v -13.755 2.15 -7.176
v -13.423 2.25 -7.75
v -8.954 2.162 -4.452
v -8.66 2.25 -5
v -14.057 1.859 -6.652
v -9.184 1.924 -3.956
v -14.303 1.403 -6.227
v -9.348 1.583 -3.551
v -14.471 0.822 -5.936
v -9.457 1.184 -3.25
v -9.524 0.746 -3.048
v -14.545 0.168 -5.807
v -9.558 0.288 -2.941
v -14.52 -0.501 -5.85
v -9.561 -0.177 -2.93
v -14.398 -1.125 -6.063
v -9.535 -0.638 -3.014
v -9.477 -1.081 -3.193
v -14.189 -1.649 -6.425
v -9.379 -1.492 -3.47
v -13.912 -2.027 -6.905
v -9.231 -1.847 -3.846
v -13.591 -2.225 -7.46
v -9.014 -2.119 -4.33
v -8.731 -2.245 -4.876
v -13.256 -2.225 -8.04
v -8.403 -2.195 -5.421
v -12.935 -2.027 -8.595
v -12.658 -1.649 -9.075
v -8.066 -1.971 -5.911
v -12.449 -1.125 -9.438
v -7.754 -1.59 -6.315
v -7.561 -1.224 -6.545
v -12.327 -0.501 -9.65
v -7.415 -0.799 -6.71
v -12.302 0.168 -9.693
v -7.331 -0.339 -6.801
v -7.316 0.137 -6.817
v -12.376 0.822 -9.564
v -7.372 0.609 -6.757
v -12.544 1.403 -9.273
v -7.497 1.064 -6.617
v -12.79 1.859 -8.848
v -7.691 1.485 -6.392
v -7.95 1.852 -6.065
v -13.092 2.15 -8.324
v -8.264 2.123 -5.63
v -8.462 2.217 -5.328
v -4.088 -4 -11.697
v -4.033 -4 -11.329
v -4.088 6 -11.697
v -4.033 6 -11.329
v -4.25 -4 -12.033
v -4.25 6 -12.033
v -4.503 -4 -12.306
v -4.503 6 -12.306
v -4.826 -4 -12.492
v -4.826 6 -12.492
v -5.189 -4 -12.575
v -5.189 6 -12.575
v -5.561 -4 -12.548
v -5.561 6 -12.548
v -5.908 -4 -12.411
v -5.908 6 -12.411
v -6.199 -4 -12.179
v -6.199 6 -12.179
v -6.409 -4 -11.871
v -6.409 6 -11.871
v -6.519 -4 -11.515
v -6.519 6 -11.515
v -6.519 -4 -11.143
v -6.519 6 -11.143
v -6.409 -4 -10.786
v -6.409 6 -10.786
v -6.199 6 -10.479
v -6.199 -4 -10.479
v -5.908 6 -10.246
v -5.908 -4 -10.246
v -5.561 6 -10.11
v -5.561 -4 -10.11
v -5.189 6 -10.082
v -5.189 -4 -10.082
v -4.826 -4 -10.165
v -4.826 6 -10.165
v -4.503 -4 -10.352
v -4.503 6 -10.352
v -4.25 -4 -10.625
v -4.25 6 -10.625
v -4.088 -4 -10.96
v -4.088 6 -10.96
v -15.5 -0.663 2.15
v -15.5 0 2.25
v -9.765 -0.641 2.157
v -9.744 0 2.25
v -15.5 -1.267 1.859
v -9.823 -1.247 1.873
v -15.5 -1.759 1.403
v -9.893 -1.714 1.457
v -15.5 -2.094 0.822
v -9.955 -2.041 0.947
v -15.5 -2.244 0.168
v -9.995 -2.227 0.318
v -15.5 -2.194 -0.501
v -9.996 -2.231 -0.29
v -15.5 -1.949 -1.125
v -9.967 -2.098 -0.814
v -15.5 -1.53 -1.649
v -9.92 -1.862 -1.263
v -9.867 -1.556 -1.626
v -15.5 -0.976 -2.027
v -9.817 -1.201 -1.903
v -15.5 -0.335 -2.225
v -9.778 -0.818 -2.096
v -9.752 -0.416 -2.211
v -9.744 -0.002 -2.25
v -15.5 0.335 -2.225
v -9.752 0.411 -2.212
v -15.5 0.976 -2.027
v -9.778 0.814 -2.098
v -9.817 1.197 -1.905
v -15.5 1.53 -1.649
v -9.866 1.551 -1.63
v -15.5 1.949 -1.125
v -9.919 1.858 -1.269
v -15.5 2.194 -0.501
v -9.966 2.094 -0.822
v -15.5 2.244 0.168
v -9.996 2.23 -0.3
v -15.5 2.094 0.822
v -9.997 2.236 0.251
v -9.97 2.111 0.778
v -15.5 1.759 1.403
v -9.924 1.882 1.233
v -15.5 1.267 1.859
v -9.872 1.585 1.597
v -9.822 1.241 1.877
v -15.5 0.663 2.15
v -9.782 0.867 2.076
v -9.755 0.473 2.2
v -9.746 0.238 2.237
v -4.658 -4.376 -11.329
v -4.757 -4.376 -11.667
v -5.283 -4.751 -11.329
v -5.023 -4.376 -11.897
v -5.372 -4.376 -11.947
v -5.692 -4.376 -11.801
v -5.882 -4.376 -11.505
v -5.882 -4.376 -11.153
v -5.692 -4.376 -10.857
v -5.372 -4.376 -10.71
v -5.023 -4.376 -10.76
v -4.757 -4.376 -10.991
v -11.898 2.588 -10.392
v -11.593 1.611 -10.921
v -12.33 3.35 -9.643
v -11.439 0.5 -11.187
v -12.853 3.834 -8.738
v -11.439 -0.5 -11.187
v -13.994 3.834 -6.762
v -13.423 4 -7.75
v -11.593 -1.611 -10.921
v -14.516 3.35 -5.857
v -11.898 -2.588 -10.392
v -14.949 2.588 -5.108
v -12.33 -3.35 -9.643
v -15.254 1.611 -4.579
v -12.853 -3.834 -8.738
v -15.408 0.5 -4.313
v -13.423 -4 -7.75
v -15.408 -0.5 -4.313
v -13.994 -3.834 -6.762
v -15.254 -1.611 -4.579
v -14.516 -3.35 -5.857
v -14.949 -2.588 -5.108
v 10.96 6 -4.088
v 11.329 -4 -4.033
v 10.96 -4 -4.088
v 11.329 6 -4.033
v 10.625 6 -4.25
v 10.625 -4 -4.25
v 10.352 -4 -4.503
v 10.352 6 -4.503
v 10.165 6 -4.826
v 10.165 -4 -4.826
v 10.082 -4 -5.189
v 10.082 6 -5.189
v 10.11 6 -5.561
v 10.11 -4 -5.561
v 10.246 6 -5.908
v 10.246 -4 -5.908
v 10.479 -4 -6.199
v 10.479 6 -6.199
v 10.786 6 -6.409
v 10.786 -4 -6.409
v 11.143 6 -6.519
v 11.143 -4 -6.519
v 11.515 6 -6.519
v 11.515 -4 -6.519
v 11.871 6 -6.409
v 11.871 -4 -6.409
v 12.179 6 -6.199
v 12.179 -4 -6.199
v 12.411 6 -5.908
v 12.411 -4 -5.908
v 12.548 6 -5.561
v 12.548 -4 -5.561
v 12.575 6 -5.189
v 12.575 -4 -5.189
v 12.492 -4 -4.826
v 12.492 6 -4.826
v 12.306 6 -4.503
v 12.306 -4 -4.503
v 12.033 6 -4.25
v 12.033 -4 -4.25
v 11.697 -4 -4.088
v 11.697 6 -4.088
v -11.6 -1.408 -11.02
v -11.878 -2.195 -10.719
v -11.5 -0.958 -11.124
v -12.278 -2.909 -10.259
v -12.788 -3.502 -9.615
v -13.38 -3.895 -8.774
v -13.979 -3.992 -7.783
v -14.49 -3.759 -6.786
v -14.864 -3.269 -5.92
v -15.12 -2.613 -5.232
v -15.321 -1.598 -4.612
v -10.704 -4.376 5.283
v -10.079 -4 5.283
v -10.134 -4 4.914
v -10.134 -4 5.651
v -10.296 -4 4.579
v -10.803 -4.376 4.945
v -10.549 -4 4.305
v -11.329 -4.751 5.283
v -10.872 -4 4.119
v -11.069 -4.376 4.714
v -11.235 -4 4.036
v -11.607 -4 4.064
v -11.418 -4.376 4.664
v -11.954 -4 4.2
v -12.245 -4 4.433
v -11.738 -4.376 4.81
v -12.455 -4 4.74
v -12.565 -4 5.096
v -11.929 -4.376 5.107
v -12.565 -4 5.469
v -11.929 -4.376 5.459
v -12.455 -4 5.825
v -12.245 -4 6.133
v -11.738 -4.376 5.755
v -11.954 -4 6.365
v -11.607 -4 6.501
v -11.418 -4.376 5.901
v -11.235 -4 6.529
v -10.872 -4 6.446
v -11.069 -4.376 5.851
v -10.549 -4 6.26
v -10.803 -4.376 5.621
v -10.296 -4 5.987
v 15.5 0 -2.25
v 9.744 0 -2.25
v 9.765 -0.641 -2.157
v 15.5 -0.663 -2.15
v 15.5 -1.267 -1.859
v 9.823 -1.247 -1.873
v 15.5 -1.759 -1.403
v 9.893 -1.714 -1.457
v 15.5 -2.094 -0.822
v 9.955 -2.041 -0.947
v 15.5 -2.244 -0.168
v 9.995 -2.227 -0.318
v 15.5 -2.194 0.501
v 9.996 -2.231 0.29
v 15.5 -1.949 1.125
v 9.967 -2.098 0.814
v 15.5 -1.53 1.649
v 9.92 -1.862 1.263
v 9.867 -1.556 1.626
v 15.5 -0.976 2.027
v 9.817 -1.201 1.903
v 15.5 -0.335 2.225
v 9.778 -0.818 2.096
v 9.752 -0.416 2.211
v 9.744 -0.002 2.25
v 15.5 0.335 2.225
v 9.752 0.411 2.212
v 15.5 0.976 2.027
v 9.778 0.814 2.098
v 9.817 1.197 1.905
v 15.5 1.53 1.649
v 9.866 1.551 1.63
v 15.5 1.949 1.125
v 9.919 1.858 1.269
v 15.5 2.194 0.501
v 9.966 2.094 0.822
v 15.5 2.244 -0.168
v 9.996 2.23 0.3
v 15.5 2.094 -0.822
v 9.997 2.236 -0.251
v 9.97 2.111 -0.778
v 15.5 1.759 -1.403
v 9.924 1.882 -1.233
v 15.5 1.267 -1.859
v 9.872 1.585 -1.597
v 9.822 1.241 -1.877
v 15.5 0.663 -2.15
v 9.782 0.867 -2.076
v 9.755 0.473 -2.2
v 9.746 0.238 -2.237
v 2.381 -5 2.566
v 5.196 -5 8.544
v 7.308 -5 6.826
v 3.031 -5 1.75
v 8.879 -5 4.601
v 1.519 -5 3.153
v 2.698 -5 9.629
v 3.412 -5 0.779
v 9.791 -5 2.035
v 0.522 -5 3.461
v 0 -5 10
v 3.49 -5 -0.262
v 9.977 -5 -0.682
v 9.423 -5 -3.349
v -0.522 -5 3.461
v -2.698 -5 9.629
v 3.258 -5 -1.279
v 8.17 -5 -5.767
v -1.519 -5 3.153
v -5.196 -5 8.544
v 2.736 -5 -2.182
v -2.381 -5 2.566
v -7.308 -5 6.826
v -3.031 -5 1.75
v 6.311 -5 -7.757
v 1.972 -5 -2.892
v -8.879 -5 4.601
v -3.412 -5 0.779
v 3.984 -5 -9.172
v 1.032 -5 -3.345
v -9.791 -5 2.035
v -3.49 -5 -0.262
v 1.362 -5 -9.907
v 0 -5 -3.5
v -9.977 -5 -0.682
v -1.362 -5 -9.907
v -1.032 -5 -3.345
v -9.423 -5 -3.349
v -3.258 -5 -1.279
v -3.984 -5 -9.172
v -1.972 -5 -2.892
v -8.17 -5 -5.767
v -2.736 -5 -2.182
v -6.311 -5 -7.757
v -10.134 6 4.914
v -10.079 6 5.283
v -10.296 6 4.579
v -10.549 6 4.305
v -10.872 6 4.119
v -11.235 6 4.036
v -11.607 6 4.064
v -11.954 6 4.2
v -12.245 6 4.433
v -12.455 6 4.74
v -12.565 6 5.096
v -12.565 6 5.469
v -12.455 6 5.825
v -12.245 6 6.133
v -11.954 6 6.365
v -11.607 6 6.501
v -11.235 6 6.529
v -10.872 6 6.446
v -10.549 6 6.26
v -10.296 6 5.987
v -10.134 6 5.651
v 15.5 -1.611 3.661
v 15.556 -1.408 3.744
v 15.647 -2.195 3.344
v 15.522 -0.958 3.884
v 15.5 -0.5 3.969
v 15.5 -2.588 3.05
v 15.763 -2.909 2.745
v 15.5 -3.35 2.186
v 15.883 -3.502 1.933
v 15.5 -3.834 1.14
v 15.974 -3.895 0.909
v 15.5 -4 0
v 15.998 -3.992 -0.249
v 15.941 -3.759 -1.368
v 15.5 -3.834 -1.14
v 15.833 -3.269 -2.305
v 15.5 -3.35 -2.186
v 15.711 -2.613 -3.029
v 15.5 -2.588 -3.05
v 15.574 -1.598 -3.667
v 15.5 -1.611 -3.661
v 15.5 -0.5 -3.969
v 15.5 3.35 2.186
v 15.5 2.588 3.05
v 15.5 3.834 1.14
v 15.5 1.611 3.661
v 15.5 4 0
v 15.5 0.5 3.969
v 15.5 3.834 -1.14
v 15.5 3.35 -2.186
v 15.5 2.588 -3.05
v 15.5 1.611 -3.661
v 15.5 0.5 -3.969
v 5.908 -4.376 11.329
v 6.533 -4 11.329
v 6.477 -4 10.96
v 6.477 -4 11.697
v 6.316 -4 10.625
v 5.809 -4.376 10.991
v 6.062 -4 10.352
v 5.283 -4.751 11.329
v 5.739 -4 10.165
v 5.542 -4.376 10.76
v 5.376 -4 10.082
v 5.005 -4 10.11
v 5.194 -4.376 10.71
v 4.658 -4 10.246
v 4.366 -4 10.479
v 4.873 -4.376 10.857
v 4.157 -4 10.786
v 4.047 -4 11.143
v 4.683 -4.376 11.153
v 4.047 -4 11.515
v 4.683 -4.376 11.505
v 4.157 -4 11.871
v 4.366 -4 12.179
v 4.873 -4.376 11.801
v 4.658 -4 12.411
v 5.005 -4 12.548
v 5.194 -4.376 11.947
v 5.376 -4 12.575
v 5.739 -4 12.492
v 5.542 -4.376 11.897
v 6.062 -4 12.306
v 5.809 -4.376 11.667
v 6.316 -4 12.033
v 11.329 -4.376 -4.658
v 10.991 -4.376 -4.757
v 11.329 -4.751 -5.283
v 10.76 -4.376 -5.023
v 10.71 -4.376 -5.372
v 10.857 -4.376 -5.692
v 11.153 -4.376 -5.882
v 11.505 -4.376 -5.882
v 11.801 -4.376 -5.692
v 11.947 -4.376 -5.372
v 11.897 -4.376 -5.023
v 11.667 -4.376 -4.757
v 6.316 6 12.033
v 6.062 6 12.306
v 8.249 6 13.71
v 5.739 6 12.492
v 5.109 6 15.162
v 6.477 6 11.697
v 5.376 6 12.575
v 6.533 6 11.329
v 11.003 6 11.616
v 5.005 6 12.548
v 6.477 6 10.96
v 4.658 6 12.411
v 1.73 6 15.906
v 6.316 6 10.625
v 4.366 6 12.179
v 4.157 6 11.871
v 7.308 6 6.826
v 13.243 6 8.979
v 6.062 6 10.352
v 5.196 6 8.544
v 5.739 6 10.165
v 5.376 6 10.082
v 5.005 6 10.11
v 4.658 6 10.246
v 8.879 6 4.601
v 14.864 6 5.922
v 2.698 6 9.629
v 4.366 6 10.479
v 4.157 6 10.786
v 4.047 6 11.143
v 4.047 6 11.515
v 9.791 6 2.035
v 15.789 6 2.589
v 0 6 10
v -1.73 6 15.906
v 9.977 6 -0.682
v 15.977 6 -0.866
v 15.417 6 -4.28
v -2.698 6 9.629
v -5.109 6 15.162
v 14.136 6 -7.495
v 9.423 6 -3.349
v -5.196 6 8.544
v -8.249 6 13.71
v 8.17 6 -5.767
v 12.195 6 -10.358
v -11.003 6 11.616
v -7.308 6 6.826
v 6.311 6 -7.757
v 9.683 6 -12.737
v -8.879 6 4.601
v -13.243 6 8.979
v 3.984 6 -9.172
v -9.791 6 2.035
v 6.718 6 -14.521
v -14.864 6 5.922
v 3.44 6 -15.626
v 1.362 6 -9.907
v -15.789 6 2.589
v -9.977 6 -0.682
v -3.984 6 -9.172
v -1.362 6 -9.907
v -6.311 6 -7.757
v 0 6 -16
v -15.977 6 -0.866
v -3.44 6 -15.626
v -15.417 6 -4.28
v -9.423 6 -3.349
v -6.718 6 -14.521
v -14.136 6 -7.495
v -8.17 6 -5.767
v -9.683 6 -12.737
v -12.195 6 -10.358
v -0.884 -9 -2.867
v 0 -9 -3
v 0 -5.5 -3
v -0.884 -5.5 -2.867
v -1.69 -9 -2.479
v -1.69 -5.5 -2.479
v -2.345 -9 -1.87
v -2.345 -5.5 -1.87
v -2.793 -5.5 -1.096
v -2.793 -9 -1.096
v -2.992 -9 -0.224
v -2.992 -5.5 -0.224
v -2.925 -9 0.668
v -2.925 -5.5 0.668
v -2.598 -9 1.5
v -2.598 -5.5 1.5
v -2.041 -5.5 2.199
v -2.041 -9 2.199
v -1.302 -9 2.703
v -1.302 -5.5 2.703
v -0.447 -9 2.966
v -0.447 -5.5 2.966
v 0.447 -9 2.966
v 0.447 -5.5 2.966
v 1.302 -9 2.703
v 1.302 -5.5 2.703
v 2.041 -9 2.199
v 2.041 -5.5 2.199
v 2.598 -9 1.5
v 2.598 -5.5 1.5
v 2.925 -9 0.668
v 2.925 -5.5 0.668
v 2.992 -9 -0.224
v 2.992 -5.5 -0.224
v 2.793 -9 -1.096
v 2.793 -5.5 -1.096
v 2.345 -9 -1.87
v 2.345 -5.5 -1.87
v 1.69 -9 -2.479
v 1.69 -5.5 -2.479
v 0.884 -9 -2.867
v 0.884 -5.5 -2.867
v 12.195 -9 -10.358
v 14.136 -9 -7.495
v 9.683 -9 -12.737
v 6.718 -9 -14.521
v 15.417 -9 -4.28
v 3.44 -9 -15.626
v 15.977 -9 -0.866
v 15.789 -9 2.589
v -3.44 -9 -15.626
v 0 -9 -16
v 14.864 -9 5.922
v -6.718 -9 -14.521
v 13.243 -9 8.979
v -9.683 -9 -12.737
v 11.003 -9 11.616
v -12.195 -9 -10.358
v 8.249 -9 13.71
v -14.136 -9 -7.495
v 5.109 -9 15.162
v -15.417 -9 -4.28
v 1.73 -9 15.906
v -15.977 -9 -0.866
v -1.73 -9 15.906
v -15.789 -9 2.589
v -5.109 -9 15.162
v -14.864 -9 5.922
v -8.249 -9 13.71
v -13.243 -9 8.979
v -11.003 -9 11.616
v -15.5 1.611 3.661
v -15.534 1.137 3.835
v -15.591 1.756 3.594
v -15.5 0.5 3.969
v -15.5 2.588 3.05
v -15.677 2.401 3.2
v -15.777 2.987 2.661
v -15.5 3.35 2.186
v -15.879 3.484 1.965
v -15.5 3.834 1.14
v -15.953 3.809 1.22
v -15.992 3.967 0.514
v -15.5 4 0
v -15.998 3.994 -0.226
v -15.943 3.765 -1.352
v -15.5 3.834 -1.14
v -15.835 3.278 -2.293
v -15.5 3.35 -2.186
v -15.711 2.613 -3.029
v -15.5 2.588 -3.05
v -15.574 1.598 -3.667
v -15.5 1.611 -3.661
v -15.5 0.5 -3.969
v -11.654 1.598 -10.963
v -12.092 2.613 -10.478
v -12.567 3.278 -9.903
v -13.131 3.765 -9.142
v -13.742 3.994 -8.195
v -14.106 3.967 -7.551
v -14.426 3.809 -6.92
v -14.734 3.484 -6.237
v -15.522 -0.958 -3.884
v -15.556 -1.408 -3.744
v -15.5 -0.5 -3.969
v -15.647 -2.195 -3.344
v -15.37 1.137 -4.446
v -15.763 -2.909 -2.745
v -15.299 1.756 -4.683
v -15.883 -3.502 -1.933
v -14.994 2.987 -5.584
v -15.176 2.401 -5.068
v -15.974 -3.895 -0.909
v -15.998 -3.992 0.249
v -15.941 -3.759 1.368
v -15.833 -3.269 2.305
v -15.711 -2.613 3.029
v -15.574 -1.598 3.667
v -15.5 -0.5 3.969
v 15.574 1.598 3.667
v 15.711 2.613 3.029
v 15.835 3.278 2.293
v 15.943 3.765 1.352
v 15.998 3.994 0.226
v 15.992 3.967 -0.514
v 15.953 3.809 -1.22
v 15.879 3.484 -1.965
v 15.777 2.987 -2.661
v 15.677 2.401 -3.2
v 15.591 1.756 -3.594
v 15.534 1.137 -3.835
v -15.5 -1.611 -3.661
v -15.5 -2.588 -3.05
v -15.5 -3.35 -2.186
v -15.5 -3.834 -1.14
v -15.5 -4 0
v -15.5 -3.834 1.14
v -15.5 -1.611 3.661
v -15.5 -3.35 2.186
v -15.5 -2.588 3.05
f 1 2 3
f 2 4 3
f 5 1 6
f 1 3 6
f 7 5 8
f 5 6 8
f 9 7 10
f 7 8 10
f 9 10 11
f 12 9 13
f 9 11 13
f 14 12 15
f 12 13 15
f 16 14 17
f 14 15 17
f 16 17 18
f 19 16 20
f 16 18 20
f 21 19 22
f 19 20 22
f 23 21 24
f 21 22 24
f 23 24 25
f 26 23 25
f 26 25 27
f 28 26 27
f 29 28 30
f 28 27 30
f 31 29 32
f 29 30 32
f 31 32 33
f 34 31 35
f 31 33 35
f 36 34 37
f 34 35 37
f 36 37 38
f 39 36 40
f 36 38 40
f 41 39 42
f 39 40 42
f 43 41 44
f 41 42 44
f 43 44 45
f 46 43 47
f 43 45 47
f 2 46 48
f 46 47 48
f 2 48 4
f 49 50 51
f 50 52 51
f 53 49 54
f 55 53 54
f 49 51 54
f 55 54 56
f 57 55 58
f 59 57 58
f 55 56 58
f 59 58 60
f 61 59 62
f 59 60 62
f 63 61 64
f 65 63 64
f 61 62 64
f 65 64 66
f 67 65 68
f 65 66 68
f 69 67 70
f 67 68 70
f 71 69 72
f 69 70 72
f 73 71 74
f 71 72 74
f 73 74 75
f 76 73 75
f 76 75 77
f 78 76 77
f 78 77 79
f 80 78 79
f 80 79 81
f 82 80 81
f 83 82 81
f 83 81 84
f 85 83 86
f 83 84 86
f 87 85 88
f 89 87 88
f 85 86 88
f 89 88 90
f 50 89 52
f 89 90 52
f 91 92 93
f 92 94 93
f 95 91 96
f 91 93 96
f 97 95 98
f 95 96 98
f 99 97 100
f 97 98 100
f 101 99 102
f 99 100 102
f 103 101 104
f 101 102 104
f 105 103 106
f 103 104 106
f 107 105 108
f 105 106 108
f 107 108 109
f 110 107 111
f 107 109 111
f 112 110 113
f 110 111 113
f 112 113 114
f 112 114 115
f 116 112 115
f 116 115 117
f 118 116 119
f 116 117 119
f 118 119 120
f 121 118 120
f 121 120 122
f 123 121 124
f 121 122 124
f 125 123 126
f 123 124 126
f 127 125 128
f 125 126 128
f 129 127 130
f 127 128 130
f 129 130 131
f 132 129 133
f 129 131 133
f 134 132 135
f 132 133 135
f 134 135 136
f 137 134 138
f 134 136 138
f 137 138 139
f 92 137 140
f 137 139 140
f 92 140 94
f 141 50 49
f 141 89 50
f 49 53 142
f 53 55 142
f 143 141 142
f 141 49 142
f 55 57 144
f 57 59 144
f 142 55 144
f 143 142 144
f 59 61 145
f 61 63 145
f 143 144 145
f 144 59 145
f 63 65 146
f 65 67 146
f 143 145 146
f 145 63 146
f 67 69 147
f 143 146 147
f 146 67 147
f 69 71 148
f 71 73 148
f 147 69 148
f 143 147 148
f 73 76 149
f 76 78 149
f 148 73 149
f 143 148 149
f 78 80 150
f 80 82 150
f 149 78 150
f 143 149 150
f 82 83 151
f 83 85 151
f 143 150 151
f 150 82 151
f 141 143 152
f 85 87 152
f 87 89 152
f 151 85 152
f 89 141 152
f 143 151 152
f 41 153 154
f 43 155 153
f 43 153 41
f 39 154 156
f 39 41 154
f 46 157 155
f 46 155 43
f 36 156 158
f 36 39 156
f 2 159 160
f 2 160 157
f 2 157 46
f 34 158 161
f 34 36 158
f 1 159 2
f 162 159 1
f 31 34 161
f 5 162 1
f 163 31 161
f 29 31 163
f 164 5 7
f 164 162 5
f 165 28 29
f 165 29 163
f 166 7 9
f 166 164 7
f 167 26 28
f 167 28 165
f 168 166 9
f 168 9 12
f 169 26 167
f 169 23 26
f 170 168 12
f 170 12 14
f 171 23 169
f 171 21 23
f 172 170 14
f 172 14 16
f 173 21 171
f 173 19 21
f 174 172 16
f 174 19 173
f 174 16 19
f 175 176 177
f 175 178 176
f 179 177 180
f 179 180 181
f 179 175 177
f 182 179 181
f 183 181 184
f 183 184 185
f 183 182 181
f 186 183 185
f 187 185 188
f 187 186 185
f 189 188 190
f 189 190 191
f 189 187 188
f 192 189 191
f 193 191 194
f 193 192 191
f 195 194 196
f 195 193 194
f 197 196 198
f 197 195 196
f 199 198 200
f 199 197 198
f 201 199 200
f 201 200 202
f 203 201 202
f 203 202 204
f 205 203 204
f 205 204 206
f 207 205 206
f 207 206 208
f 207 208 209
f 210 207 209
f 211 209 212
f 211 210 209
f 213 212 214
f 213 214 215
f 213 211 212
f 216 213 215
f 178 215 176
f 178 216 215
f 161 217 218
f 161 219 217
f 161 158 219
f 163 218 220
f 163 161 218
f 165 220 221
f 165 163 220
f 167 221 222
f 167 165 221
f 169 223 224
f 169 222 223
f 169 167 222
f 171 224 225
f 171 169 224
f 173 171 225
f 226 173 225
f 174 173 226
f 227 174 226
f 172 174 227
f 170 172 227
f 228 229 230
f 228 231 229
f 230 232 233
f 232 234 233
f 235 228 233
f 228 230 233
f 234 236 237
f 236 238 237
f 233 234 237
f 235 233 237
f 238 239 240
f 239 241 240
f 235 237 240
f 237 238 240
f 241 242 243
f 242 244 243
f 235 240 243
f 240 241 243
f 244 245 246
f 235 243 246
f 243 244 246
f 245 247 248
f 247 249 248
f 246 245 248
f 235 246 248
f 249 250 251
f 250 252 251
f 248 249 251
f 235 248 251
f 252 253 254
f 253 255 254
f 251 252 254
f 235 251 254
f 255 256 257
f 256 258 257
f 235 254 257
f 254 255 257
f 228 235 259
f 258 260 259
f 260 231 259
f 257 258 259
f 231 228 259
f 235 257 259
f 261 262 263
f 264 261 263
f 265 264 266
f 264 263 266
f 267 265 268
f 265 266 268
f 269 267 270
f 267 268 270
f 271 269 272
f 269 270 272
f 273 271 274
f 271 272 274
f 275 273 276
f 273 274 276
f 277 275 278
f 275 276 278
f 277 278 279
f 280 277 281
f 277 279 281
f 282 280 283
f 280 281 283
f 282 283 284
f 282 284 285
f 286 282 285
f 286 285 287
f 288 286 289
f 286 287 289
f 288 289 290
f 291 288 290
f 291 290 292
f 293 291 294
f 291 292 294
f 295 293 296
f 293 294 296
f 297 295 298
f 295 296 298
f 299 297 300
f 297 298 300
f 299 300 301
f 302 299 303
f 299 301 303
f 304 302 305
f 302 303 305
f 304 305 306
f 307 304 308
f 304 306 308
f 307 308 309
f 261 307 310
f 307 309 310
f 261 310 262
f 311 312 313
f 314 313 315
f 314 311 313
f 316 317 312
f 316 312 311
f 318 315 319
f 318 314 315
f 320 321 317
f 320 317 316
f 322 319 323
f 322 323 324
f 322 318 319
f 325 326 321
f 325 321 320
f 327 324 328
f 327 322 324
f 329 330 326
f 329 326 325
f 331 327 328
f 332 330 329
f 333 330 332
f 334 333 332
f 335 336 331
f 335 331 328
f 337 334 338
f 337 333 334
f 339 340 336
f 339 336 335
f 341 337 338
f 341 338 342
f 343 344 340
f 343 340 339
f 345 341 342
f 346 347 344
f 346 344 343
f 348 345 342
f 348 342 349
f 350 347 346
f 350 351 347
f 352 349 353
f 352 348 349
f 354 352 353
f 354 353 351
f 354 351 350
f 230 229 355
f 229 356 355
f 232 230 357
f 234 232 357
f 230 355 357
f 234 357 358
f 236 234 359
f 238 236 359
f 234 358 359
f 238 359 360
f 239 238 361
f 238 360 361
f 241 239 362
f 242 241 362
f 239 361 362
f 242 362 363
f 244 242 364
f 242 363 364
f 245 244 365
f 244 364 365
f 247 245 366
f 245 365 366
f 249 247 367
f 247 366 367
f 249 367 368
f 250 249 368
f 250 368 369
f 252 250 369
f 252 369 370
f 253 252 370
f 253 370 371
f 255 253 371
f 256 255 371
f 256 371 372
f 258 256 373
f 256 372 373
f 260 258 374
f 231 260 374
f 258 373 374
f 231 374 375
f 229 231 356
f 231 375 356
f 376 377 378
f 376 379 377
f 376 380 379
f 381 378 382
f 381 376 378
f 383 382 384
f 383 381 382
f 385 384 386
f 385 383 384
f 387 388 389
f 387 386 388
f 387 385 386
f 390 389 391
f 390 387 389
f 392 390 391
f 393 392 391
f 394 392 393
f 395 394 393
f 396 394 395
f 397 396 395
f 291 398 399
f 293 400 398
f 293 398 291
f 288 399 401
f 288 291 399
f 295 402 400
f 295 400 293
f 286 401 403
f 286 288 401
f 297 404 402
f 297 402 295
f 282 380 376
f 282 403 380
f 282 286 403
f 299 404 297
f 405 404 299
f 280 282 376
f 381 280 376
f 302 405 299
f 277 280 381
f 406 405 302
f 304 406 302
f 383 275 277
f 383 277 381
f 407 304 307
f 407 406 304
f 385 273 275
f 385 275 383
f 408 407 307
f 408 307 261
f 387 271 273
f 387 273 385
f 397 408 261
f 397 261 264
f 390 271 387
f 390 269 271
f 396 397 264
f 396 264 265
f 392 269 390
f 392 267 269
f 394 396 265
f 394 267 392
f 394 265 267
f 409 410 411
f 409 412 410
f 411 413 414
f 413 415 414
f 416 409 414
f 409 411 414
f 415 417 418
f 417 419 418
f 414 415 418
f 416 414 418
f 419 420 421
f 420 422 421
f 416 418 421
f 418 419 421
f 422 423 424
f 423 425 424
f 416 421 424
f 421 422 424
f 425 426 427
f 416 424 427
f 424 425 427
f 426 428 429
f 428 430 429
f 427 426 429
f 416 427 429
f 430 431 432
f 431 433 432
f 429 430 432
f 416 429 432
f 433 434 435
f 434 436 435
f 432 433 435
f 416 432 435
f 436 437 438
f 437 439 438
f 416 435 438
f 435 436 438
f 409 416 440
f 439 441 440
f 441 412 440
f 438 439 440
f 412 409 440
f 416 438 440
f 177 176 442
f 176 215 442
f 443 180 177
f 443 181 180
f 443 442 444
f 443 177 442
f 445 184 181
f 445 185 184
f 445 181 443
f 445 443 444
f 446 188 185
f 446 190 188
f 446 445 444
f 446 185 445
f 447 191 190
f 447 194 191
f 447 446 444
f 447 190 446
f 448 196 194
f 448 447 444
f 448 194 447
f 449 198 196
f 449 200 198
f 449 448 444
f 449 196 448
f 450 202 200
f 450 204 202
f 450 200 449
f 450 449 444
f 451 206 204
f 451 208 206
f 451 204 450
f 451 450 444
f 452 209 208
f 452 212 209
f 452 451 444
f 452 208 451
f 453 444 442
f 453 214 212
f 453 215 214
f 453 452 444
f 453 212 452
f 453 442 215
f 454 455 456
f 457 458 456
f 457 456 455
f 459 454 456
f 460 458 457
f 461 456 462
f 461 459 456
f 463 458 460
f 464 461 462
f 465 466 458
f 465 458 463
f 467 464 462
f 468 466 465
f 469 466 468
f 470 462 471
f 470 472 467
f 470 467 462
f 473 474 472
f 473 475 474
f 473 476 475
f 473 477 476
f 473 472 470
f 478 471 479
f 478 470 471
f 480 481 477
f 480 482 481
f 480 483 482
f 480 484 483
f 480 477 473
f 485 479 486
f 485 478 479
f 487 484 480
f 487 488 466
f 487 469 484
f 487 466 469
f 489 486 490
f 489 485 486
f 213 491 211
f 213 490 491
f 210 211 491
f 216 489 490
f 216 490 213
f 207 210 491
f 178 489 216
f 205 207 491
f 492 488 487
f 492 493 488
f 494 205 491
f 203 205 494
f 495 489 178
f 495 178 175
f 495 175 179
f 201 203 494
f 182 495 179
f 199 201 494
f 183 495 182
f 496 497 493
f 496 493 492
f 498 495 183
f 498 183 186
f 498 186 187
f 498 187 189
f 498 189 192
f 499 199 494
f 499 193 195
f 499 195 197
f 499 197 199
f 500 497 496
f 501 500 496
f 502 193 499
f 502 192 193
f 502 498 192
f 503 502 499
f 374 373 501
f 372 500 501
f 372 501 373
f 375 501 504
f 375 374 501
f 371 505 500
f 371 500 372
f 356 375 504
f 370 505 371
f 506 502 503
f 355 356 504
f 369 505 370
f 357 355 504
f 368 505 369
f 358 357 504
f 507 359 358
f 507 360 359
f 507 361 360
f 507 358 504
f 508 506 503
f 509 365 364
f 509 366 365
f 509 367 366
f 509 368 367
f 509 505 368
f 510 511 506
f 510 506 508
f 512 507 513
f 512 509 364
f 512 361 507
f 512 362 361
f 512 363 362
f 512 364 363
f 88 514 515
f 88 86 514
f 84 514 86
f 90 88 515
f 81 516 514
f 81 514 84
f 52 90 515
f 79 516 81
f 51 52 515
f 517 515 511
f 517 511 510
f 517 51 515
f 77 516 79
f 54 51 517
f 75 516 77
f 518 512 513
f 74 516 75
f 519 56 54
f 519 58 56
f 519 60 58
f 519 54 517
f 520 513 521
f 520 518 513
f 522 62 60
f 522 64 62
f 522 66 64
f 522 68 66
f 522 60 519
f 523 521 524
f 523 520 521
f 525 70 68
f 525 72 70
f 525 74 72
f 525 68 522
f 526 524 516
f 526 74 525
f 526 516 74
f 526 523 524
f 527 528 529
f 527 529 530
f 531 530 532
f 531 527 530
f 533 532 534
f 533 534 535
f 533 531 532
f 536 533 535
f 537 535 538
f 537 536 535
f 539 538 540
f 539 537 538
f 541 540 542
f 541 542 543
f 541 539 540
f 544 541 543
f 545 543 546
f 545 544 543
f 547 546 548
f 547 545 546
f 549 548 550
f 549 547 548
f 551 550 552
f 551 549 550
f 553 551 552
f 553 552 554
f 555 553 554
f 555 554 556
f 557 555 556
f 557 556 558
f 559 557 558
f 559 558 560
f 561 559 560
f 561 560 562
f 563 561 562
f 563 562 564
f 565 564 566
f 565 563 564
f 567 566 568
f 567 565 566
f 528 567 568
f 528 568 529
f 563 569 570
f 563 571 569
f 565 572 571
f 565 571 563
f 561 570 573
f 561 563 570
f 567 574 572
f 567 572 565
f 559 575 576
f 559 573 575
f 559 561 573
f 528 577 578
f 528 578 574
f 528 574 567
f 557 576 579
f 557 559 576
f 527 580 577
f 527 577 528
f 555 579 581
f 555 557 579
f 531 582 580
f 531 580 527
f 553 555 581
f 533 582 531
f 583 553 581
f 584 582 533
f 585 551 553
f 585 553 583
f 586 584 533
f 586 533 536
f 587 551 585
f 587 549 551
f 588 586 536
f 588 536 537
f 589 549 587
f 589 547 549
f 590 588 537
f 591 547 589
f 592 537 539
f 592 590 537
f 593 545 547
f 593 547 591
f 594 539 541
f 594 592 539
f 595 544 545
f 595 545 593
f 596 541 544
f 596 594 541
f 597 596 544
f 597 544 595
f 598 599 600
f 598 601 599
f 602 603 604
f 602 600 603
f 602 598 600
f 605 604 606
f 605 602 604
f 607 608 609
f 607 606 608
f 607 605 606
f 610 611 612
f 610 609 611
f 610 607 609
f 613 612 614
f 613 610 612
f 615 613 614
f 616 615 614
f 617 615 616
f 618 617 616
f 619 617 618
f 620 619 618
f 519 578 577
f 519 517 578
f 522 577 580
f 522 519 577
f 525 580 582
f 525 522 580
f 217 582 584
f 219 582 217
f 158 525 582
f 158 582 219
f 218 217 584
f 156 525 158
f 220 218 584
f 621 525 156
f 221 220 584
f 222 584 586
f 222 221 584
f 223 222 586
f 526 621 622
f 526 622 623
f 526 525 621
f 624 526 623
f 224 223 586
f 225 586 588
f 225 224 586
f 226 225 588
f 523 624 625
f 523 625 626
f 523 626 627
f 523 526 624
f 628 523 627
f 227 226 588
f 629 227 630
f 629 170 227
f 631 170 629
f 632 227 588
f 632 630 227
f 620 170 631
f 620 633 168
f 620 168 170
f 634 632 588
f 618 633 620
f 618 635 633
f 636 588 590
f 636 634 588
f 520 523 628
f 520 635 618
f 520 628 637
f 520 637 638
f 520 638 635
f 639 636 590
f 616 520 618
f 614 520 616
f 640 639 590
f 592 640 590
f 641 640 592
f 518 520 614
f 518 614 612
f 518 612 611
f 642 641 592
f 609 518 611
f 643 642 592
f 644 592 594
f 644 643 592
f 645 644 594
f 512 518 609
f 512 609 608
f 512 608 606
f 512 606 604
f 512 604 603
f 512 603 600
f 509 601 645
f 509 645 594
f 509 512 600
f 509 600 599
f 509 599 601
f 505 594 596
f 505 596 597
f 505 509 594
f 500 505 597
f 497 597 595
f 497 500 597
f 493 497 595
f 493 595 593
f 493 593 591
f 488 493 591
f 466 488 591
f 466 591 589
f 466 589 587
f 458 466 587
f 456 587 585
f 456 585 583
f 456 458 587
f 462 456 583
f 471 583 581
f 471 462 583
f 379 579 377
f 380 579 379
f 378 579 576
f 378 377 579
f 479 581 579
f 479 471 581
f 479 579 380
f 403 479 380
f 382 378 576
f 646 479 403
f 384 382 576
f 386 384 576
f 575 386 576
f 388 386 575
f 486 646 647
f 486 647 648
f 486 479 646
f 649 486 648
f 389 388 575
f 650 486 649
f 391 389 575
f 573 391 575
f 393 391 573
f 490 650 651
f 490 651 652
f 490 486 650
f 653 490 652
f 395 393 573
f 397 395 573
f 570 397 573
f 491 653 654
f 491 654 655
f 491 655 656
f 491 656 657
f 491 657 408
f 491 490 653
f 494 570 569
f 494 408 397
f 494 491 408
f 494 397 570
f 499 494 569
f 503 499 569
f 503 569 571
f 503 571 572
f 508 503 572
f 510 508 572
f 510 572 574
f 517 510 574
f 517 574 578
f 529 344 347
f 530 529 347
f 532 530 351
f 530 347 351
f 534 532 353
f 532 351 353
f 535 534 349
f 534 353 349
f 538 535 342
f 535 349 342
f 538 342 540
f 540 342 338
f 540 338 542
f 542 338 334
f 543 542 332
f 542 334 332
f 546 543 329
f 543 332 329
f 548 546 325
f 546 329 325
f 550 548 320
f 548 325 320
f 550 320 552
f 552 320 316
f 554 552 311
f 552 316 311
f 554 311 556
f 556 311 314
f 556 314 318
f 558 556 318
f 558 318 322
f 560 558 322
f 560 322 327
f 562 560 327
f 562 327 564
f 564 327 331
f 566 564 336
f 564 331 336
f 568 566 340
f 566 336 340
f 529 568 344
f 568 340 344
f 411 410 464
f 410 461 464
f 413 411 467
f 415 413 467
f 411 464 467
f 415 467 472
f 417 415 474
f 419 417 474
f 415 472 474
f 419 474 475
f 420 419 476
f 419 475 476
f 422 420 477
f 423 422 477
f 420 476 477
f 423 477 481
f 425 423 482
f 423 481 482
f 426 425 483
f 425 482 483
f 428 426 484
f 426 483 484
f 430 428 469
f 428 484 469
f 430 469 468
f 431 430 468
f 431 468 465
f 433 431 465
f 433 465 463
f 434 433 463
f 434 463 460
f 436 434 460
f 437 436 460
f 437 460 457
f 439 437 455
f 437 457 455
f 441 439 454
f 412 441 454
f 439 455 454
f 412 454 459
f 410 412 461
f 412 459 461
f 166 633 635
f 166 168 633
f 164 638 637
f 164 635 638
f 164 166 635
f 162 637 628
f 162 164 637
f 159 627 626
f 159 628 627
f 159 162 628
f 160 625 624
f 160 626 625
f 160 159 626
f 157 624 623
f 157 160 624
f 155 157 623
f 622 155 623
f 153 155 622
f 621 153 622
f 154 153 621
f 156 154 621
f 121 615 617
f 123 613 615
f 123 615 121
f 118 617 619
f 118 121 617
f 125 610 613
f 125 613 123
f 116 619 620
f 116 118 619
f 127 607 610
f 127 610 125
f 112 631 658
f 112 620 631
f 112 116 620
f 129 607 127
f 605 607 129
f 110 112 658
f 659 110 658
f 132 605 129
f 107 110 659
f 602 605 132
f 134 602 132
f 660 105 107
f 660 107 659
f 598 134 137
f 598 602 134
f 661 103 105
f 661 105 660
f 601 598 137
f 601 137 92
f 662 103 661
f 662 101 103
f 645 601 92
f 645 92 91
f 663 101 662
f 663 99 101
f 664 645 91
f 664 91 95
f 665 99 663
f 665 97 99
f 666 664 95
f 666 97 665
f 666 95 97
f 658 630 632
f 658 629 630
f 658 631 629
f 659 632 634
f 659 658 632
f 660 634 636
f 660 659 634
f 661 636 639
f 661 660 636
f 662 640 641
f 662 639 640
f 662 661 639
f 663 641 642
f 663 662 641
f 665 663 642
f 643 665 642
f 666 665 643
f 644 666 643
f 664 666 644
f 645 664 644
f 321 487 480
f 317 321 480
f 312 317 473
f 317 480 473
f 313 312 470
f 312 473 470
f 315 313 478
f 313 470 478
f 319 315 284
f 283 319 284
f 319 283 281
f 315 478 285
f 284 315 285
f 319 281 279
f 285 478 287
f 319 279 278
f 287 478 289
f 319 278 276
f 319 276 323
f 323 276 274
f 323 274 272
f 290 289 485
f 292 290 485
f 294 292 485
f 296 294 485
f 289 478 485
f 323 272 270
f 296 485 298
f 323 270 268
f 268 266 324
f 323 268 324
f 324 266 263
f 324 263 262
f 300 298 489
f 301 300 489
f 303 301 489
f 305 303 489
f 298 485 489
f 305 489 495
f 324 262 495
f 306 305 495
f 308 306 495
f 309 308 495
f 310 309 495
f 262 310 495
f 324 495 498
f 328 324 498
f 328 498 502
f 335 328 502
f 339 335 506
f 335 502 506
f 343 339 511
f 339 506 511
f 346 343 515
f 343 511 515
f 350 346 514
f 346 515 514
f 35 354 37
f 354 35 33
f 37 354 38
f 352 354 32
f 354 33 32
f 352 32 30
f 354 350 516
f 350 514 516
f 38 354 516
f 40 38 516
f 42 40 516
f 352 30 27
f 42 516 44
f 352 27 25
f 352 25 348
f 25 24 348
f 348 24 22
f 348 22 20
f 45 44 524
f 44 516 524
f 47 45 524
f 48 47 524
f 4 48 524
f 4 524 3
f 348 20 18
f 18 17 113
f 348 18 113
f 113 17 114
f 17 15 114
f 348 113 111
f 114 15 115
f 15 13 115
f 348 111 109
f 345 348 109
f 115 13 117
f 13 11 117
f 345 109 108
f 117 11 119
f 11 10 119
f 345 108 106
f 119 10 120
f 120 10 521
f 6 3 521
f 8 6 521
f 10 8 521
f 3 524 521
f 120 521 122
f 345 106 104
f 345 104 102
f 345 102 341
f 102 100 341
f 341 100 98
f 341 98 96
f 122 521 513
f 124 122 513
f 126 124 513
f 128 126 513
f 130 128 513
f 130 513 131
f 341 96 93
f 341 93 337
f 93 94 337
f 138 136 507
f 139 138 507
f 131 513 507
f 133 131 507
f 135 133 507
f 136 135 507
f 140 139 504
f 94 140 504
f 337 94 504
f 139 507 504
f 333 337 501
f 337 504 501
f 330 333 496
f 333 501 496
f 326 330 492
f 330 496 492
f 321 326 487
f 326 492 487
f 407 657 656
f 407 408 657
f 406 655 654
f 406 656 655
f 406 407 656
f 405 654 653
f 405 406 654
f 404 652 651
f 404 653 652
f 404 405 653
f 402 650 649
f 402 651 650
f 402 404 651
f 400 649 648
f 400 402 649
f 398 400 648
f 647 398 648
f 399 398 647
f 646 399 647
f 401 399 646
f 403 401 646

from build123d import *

# Parameters (mm, degrees)
ESBO_O4_W                        = 2.25
ESBO_O4_H                        = 16
F_4_5_4_5_DIAMETER_HOLE2_D       = 4.5
F_4_5_4_5_DIAMETER_HOLE2_DEPTH   = 18
F_4_5_4_5_DIAMETER_HOLE2_TIP     = 1.351936393
ESBO_O12_R                       = 16
ESBO_O12_R_2                     = 9
RESSALTO_EXTRUS_O1_DEPTH         = 1
CHANFRO1_SIZE                    = 0.5
CHANFRO2_SIZE                    = 0.25
FURO_DE_DI_METRO_4_5_4_5_2_D     = 4.5
FURO_DE_DI_METRO_4_5_4_5_2_DEPTH = 8
FURO_DE_DI_METRO_4_5_4_5_2_TIP   = 1.351936393
CORTE_EXTRUS_O4_START            = -0.5
ESBO_O18_R                       = 4
ESBO_O18_R_2                     = 2.25
CORTE_EXTRUS_O4_DEPTH            = 0.5
PADR_OCIRCULAR6_COUNT            = 2
PADR_OCIRCULAR6_ANGLE            = 30
PADR_OCIRCULAR7_COUNT            = 2
PADR_OCIRCULAR7_ANGLE            = 210
REBAIXO_INSERTO_REACH            = 29.148
ESBO_O20_R                       = 10


# Read off the part's stored shape, not the designer's step: PadrãoCircular5
with BuildPart() as part:
    # Esboço1 → Revolução1 (revolve)
    with BuildSketch(Plane.XY, mode=Mode.PRIVATE) as revolu_o1_sk:
        Polygon((3, -9), (16, -9), (16, 5), (9, 5), (9, -5), (3, -5), align=None)
    revolve(revolu_o1_sk.sketch.rotate(Axis((0, -9, 0), (0, 1, 0)), 90), axis=Axis((0, -9, 0), (0, 1, 0)))

    # Esboço4 → Furo de diâmetro Ø4.5 (4.5)1 (revolve, cut)
    with BuildSketch(Plane(origin=(16, 0, 0), x_dir=(0, 0, -1), z_dir=(0, 1, 0))):
        with Locations((1.125, 8)):
            Rectangle(ESBO_O4_W, ESBO_O4_H)
    revolve(axis=Axis((22.35, 0, 0), (-1, 0, 0)), mode=Mode.SUBTRACT)

    # Ø4.5 (4.5) Diameter Hole2
    with Locations(Plane(origin=(-13.856406461, 0, -8), x_dir=(0, -1, 0), z_dir=(-0.8660254037844364, 0, -0.5000000000000041))):
        with Locations((0, 0)):
            Hole(F_4_5_4_5_DIAMETER_HOLE2_D / 2, depth=F_4_5_4_5_DIAMETER_HOLE2_DEPTH)
            with Locations((0, 0, -(F_4_5_4_5_DIAMETER_HOLE2_DEPTH + F_4_5_4_5_DIAMETER_HOLE2_TIP / 2))):  # 118° drill point
                Cone(0, F_4_5_4_5_DIAMETER_HOLE2_D / 2, F_4_5_4_5_DIAMETER_HOLE2_TIP, mode=Mode.SUBTRACT)

    # Esboço12 → Ressalto-extrusão1 (add)
    with BuildSketch(Plane(origin=(0, 5, 0), x_dir=(1, 0, 0), z_dir=(0, 1, 0))):
        with Locations(Location((0, 0, 0), (0, 0, 90))):
            Circle(ESBO_O12_R)
        with Locations(Location((0, 0, 0), (0, 0, 90))):
            Circle(ESBO_O12_R_2, mode=Mode.SUBTRACT)
    extrude(amount=RESSALTO_EXTRUS_O1_DEPTH)

    # Esboço13 → Furo roscado de M3x0.51 (revolve, cut)
    with BuildSketch(Plane(origin=(11.328847338, 6, -5.282728272), x_dir=(0, 0, 1), z_dir=(1, 0, 0))):
        Polygon((0, 0), (0, 10.751075774), (1.25, 10), (1.25, 0), align=None)
    revolve(axis=Axis((11.328847338, 12.35, -5.282728272), (0, -1, 0)), mode=Mode.SUBTRACT)

    # PadrãoCircular5 outline → PadrãoCircular5 (revolve, cut)
    with BuildSketch(Plane(origin=(5.282728272, 0, 11.328847338), x_dir=(1, 0, 0), z_dir=(0, 0, 1))):
        Polygon((0, 6), (0, -4.751075774), (1.25, -4), (1.25, 6), align=None)
    revolve(axis=Axis((5.282728272, 0, 11.328847338), (0, 1, 0)), mode=Mode.SUBTRACT)

    # Padr_oCircular5 2 outline → Padr_oCircular5 2 (revolve, cut)
    with BuildSketch(Plane(origin=(-11.328847338, 0, 5.282728272), x_dir=(1, 0, 0), z_dir=(0, 0, 1))):
        Polygon((0, 6), (0, -4.751075774), (1.25, -4), (1.25, 6), align=None)
    revolve(axis=Axis((-11.328847338, 0, 5.282728272), (0, 1, 0)), mode=Mode.SUBTRACT)

    # Padr_oCircular5 3 outline → Padr_oCircular5 3 (revolve, cut)
    with BuildSketch(Plane(origin=(-5.282728272, 0, -11.328847338), x_dir=(1, 0, 0), z_dir=(0, 0, 1))):
        Polygon((0, 6), (0, -4.751075774), (1.25, -4), (1.25, 6), align=None)
    revolve(axis=Axis((-5.282728272, 0, -11.328847338), (0, 1, 0)), mode=Mode.SUBTRACT)

    # Chanfro1
    chanfro1_edges = [part.edges().sort_by_distance(p)[0] for p in [
        (0, -5, 3),
    ]]
    chamfer(chanfro1_edges, length=CHANFRO1_SIZE)

    # Chanfro2
    chanfro2_edges = [part.edges().sort_by_distance(p)[0] for p in [
        (0, 6, 9),
    ]]
    chamfer(chanfro2_edges, length=CHANFRO2_SIZE)

    # Furo de diâmetro Ø4.5 (4.5)2
    with Locations(Plane(origin=(-16, 0, 0), x_dir=(0, 0, -1), z_dir=(-1, 0, 0))):
        with Locations((0, 0)):
            Hole(FURO_DE_DI_METRO_4_5_4_5_2_D / 2, depth=FURO_DE_DI_METRO_4_5_4_5_2_DEPTH)
            with Locations((0, 0, -(FURO_DE_DI_METRO_4_5_4_5_2_DEPTH + FURO_DE_DI_METRO_4_5_4_5_2_TIP / 2))):  # 118° drill point
                Cone(0, FURO_DE_DI_METRO_4_5_4_5_2_D / 2, FURO_DE_DI_METRO_4_5_4_5_2_TIP, mode=Mode.SUBTRACT)

    # Esboço18 → Corte-extrusão4 (cut)
    with BuildSketch(Plane(origin=(-13.856406461, 0, -8), x_dir=(0, -1, 0), z_dir=(-0.8660254037844364, 0, -0.5000000000000041)).offset(CORTE_EXTRUS_O4_START)):
        Circle(ESBO_O18_R)
        with Locations(Location((0, 0, 0), (0, 0, 90))):
            Circle(ESBO_O18_R_2, mode=Mode.SUBTRACT)
    corte_extrus_o4 = extrude(amount=CORTE_EXTRUS_O4_DEPTH, mode=Mode.SUBTRACT)

    # PadrãoCircular6: Corte-extrusão4 ×2 about axis
    padr_ocircular6_axis = Axis((0, -9.75, 0), (0, 1, 0))
    for i in range(1, PADR_OCIRCULAR6_COUNT):
        add(corte_extrus_o4.rotate(padr_ocircular6_axis, i * PADR_OCIRCULAR6_ANGLE / (PADR_OCIRCULAR6_COUNT - 1)), mode=Mode.SUBTRACT)

    # PadrãoCircular7: Corte-extrusão4 ×2 about axis
    padr_ocircular7_axis = Axis((0, -9.75, 0), (0, 1, 0))
    for i in range(1, PADR_OCIRCULAR7_COUNT):
        add(corte_extrus_o4.rotate(padr_ocircular7_axis, i * PADR_OCIRCULAR7_ANGLE / (PADR_OCIRCULAR7_COUNT - 1)), mode=Mode.SUBTRACT)

    # Rebaixo_Inserto: up to this face of the body (flat: up to its plane)
    rebaixo_inserto_end = Plane(part.part.faces().sort_by_distance((0, -5, 3.754558441))[0])
    # Esboço20 → Rebaixo_Inserto (cut, up to the picked face)
    with BuildSketch(Plane(origin=(0, 6, 0), x_dir=(1, 0, 0), z_dir=(0, 1, 0)), mode=Mode.PRIVATE) as rebaixo_inserto_sk1:
        with Locations(Location((0, 0, 0), (0, 0, 270))):
            Circle(ESBO_O20_R)
    rebaixo_inserto_tool1 = split(extrude(rebaixo_inserto_sk1.sketch, amount=-REBAIXO_INSERTO_REACH, mode=Mode.PRIVATE), bisect_by=rebaixo_inserto_end, keep=Keep.BOTH, mode=Mode.PRIVATE)
    add(rebaixo_inserto_tool1.solids().sort_by(Axis((0, 6, 0), (0, -1, 0)))[0], mode=Mode.SUBTRACT)


solid = part.part
